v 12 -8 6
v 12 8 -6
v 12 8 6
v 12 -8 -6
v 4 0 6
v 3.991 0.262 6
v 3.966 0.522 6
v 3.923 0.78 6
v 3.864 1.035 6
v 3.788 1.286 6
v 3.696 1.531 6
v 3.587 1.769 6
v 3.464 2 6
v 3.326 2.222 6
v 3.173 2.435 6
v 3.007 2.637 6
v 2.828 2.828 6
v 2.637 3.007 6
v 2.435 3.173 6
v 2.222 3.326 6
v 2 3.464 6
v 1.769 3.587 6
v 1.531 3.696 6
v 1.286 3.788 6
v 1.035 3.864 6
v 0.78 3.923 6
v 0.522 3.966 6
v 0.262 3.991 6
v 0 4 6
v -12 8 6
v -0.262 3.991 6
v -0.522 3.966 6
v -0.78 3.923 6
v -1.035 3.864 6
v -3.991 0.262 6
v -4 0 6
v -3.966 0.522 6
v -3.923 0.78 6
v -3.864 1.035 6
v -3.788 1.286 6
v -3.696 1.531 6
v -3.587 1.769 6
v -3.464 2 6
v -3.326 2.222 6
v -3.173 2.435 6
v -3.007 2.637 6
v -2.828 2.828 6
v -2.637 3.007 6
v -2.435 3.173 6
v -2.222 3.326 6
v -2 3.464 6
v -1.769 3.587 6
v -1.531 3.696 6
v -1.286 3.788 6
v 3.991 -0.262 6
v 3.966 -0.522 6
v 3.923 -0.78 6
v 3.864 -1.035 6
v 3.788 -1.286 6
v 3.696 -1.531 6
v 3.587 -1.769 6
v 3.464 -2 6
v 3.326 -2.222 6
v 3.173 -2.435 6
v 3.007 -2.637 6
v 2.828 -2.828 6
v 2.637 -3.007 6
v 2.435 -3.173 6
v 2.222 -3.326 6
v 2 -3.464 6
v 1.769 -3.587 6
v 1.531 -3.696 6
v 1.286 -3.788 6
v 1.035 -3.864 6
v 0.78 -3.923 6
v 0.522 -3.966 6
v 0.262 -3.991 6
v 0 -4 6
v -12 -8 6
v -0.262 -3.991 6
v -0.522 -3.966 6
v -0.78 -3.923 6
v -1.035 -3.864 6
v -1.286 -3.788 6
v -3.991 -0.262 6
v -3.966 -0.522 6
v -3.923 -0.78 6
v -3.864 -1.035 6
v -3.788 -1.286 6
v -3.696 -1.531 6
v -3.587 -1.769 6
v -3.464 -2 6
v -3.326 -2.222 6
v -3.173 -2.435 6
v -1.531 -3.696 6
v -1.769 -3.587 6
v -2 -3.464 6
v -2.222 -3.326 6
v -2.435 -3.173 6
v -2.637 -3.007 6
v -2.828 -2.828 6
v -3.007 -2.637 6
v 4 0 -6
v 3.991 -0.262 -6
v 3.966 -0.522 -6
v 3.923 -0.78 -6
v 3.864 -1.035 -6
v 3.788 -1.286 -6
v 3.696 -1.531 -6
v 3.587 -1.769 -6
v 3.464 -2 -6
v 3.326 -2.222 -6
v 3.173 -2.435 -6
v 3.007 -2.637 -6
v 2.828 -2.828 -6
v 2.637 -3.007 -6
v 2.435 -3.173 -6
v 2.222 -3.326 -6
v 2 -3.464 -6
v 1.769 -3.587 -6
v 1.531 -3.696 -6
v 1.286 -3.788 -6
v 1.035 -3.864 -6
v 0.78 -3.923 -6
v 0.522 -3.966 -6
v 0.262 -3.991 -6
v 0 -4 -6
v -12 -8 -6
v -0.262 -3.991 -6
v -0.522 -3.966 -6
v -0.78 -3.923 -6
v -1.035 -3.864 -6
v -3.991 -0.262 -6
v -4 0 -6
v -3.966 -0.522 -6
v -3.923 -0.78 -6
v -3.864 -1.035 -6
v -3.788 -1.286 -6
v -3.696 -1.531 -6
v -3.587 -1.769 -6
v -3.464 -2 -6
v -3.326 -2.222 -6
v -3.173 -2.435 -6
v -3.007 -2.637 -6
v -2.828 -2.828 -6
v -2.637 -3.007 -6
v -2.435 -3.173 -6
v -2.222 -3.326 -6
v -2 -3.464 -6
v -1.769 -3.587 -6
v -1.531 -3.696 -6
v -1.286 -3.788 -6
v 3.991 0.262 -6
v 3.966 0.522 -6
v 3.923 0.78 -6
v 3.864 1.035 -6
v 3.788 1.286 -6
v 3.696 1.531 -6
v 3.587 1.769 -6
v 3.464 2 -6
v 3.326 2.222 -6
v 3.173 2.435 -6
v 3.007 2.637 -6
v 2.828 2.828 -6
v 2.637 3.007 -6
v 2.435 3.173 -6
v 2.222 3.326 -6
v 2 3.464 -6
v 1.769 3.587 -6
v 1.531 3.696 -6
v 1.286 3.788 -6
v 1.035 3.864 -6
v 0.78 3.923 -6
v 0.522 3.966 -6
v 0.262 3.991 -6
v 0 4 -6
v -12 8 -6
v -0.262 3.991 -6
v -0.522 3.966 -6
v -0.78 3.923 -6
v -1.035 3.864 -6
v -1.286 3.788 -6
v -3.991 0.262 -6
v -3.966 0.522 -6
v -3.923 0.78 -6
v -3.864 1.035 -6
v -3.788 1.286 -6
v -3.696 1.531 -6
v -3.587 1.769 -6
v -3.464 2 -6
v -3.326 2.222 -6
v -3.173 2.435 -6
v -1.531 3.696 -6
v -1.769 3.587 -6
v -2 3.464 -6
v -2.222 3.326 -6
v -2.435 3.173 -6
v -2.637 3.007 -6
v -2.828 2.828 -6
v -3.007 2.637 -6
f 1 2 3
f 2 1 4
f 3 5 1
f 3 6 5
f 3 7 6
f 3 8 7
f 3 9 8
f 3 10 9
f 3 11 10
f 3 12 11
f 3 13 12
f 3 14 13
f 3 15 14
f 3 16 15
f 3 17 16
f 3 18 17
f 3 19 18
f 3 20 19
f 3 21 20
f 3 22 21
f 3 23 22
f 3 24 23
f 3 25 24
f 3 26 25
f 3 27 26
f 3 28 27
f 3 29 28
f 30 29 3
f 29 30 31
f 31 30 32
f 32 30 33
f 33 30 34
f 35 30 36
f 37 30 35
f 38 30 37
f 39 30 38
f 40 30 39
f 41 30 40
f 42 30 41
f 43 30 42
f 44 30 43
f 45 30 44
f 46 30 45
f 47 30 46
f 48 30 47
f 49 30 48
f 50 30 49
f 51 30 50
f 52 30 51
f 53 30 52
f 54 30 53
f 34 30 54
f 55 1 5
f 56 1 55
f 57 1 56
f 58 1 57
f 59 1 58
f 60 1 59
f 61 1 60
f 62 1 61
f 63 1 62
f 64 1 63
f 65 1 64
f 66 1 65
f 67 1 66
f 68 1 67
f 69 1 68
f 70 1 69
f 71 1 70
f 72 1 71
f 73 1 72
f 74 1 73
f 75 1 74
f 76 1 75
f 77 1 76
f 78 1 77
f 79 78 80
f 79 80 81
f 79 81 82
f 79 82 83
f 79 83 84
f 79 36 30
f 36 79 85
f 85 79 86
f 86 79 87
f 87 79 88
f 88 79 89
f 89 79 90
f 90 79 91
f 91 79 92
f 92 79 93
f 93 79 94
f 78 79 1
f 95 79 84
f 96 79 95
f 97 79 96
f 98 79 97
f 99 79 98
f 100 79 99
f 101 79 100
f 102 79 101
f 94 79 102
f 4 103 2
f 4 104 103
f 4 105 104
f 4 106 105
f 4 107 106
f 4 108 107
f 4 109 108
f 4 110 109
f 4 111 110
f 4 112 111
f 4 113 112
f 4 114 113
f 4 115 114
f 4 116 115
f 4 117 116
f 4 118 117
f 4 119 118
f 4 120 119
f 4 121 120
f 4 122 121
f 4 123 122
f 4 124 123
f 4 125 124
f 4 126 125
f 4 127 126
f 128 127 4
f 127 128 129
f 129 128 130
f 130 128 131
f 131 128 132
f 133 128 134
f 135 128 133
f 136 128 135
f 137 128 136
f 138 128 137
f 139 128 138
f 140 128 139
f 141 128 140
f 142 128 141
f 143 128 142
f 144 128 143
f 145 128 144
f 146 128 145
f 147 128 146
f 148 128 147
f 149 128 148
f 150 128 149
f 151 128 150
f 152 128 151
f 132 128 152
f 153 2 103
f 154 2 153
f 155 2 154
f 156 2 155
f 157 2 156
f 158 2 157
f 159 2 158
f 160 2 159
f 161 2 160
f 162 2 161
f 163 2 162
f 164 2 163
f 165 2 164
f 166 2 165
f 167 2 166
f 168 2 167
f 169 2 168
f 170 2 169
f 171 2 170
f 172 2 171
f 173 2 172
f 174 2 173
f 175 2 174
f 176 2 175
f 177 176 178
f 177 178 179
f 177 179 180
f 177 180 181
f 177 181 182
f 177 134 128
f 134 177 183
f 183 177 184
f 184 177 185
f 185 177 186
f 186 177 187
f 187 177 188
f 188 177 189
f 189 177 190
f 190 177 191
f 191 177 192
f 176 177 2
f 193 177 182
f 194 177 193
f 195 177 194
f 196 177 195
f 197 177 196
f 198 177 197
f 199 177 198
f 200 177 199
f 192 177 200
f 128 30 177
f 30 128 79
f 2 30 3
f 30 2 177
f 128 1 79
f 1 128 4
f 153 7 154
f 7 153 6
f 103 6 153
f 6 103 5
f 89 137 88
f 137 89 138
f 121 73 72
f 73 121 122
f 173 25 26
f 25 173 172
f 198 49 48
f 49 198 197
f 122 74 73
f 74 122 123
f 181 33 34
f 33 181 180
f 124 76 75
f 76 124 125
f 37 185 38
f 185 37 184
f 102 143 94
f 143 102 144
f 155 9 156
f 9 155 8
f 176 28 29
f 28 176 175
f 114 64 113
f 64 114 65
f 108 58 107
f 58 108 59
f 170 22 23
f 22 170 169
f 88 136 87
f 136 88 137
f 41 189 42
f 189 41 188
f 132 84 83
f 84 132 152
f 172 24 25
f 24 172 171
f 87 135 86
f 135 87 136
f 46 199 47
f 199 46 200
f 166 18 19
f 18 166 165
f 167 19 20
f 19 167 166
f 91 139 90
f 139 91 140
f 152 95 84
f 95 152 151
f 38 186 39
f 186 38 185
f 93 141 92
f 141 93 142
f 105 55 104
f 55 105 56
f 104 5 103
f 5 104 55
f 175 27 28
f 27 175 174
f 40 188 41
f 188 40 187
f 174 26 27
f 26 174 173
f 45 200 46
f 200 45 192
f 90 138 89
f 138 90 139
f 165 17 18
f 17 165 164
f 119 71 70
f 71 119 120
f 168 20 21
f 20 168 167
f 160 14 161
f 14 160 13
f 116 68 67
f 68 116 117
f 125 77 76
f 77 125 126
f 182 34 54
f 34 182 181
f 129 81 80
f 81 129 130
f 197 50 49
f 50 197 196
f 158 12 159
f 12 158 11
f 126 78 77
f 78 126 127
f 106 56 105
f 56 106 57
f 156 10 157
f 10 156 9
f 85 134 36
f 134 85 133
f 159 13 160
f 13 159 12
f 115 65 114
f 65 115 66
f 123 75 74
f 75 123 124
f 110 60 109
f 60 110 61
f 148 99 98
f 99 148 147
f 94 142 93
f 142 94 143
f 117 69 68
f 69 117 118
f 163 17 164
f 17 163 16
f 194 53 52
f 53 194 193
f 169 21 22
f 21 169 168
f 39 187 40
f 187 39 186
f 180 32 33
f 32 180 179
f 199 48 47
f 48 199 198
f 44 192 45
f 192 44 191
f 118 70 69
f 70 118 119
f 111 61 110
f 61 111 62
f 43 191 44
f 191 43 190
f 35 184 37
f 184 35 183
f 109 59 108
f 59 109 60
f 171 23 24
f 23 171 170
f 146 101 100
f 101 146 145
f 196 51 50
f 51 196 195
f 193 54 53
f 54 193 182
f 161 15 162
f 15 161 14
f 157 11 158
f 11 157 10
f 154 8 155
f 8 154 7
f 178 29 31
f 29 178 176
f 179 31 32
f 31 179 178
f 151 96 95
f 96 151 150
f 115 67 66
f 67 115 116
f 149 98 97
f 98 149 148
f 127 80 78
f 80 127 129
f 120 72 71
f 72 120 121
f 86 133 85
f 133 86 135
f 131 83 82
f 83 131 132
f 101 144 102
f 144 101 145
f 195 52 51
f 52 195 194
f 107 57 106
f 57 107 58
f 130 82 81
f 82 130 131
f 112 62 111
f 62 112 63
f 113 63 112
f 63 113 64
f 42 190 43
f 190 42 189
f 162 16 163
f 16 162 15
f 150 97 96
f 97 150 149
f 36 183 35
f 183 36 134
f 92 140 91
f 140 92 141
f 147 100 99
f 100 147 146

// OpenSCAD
// Auto-generated from tests/data/feature_fixtures_manifest.json
// fixture: box_large_z_hole
// fixture_type: box
// description: Box with one large-diameter z-axis through-hole (d=8). Stresses hole-to-face-area ratio.
$fn = 96;

box_size = [24.000000, 16.000000, 12.000000];
box_origin = [-12.000000, -8.000000, -6.000000];

module through_hole_x(center, diameter, length) {
  translate([box_origin[0] - 0.1, center[1], center[2]])
    rotate(a=90, v=[0, 1, 0]) cylinder(d=diameter, h=length, center=false);
}

module through_hole_y(center, diameter, length) {
  translate([center[0], box_origin[1] - 0.1, center[2]])
    rotate(a=90, v=[-1, 0, 0]) cylinder(d=diameter, h=length, center=false);
}

module through_hole_z(center, diameter, length) {
  translate([center[0], center[1], box_origin[2] - 0.1])
    cylinder(d=diameter, h=length, center=false);
}

difference() {
  translate(box_origin) cube(box_size);
  through_hole_z([0.000000, 0.000000, 0.000000], 8.000000, 12.200000);  // hole_0
}
